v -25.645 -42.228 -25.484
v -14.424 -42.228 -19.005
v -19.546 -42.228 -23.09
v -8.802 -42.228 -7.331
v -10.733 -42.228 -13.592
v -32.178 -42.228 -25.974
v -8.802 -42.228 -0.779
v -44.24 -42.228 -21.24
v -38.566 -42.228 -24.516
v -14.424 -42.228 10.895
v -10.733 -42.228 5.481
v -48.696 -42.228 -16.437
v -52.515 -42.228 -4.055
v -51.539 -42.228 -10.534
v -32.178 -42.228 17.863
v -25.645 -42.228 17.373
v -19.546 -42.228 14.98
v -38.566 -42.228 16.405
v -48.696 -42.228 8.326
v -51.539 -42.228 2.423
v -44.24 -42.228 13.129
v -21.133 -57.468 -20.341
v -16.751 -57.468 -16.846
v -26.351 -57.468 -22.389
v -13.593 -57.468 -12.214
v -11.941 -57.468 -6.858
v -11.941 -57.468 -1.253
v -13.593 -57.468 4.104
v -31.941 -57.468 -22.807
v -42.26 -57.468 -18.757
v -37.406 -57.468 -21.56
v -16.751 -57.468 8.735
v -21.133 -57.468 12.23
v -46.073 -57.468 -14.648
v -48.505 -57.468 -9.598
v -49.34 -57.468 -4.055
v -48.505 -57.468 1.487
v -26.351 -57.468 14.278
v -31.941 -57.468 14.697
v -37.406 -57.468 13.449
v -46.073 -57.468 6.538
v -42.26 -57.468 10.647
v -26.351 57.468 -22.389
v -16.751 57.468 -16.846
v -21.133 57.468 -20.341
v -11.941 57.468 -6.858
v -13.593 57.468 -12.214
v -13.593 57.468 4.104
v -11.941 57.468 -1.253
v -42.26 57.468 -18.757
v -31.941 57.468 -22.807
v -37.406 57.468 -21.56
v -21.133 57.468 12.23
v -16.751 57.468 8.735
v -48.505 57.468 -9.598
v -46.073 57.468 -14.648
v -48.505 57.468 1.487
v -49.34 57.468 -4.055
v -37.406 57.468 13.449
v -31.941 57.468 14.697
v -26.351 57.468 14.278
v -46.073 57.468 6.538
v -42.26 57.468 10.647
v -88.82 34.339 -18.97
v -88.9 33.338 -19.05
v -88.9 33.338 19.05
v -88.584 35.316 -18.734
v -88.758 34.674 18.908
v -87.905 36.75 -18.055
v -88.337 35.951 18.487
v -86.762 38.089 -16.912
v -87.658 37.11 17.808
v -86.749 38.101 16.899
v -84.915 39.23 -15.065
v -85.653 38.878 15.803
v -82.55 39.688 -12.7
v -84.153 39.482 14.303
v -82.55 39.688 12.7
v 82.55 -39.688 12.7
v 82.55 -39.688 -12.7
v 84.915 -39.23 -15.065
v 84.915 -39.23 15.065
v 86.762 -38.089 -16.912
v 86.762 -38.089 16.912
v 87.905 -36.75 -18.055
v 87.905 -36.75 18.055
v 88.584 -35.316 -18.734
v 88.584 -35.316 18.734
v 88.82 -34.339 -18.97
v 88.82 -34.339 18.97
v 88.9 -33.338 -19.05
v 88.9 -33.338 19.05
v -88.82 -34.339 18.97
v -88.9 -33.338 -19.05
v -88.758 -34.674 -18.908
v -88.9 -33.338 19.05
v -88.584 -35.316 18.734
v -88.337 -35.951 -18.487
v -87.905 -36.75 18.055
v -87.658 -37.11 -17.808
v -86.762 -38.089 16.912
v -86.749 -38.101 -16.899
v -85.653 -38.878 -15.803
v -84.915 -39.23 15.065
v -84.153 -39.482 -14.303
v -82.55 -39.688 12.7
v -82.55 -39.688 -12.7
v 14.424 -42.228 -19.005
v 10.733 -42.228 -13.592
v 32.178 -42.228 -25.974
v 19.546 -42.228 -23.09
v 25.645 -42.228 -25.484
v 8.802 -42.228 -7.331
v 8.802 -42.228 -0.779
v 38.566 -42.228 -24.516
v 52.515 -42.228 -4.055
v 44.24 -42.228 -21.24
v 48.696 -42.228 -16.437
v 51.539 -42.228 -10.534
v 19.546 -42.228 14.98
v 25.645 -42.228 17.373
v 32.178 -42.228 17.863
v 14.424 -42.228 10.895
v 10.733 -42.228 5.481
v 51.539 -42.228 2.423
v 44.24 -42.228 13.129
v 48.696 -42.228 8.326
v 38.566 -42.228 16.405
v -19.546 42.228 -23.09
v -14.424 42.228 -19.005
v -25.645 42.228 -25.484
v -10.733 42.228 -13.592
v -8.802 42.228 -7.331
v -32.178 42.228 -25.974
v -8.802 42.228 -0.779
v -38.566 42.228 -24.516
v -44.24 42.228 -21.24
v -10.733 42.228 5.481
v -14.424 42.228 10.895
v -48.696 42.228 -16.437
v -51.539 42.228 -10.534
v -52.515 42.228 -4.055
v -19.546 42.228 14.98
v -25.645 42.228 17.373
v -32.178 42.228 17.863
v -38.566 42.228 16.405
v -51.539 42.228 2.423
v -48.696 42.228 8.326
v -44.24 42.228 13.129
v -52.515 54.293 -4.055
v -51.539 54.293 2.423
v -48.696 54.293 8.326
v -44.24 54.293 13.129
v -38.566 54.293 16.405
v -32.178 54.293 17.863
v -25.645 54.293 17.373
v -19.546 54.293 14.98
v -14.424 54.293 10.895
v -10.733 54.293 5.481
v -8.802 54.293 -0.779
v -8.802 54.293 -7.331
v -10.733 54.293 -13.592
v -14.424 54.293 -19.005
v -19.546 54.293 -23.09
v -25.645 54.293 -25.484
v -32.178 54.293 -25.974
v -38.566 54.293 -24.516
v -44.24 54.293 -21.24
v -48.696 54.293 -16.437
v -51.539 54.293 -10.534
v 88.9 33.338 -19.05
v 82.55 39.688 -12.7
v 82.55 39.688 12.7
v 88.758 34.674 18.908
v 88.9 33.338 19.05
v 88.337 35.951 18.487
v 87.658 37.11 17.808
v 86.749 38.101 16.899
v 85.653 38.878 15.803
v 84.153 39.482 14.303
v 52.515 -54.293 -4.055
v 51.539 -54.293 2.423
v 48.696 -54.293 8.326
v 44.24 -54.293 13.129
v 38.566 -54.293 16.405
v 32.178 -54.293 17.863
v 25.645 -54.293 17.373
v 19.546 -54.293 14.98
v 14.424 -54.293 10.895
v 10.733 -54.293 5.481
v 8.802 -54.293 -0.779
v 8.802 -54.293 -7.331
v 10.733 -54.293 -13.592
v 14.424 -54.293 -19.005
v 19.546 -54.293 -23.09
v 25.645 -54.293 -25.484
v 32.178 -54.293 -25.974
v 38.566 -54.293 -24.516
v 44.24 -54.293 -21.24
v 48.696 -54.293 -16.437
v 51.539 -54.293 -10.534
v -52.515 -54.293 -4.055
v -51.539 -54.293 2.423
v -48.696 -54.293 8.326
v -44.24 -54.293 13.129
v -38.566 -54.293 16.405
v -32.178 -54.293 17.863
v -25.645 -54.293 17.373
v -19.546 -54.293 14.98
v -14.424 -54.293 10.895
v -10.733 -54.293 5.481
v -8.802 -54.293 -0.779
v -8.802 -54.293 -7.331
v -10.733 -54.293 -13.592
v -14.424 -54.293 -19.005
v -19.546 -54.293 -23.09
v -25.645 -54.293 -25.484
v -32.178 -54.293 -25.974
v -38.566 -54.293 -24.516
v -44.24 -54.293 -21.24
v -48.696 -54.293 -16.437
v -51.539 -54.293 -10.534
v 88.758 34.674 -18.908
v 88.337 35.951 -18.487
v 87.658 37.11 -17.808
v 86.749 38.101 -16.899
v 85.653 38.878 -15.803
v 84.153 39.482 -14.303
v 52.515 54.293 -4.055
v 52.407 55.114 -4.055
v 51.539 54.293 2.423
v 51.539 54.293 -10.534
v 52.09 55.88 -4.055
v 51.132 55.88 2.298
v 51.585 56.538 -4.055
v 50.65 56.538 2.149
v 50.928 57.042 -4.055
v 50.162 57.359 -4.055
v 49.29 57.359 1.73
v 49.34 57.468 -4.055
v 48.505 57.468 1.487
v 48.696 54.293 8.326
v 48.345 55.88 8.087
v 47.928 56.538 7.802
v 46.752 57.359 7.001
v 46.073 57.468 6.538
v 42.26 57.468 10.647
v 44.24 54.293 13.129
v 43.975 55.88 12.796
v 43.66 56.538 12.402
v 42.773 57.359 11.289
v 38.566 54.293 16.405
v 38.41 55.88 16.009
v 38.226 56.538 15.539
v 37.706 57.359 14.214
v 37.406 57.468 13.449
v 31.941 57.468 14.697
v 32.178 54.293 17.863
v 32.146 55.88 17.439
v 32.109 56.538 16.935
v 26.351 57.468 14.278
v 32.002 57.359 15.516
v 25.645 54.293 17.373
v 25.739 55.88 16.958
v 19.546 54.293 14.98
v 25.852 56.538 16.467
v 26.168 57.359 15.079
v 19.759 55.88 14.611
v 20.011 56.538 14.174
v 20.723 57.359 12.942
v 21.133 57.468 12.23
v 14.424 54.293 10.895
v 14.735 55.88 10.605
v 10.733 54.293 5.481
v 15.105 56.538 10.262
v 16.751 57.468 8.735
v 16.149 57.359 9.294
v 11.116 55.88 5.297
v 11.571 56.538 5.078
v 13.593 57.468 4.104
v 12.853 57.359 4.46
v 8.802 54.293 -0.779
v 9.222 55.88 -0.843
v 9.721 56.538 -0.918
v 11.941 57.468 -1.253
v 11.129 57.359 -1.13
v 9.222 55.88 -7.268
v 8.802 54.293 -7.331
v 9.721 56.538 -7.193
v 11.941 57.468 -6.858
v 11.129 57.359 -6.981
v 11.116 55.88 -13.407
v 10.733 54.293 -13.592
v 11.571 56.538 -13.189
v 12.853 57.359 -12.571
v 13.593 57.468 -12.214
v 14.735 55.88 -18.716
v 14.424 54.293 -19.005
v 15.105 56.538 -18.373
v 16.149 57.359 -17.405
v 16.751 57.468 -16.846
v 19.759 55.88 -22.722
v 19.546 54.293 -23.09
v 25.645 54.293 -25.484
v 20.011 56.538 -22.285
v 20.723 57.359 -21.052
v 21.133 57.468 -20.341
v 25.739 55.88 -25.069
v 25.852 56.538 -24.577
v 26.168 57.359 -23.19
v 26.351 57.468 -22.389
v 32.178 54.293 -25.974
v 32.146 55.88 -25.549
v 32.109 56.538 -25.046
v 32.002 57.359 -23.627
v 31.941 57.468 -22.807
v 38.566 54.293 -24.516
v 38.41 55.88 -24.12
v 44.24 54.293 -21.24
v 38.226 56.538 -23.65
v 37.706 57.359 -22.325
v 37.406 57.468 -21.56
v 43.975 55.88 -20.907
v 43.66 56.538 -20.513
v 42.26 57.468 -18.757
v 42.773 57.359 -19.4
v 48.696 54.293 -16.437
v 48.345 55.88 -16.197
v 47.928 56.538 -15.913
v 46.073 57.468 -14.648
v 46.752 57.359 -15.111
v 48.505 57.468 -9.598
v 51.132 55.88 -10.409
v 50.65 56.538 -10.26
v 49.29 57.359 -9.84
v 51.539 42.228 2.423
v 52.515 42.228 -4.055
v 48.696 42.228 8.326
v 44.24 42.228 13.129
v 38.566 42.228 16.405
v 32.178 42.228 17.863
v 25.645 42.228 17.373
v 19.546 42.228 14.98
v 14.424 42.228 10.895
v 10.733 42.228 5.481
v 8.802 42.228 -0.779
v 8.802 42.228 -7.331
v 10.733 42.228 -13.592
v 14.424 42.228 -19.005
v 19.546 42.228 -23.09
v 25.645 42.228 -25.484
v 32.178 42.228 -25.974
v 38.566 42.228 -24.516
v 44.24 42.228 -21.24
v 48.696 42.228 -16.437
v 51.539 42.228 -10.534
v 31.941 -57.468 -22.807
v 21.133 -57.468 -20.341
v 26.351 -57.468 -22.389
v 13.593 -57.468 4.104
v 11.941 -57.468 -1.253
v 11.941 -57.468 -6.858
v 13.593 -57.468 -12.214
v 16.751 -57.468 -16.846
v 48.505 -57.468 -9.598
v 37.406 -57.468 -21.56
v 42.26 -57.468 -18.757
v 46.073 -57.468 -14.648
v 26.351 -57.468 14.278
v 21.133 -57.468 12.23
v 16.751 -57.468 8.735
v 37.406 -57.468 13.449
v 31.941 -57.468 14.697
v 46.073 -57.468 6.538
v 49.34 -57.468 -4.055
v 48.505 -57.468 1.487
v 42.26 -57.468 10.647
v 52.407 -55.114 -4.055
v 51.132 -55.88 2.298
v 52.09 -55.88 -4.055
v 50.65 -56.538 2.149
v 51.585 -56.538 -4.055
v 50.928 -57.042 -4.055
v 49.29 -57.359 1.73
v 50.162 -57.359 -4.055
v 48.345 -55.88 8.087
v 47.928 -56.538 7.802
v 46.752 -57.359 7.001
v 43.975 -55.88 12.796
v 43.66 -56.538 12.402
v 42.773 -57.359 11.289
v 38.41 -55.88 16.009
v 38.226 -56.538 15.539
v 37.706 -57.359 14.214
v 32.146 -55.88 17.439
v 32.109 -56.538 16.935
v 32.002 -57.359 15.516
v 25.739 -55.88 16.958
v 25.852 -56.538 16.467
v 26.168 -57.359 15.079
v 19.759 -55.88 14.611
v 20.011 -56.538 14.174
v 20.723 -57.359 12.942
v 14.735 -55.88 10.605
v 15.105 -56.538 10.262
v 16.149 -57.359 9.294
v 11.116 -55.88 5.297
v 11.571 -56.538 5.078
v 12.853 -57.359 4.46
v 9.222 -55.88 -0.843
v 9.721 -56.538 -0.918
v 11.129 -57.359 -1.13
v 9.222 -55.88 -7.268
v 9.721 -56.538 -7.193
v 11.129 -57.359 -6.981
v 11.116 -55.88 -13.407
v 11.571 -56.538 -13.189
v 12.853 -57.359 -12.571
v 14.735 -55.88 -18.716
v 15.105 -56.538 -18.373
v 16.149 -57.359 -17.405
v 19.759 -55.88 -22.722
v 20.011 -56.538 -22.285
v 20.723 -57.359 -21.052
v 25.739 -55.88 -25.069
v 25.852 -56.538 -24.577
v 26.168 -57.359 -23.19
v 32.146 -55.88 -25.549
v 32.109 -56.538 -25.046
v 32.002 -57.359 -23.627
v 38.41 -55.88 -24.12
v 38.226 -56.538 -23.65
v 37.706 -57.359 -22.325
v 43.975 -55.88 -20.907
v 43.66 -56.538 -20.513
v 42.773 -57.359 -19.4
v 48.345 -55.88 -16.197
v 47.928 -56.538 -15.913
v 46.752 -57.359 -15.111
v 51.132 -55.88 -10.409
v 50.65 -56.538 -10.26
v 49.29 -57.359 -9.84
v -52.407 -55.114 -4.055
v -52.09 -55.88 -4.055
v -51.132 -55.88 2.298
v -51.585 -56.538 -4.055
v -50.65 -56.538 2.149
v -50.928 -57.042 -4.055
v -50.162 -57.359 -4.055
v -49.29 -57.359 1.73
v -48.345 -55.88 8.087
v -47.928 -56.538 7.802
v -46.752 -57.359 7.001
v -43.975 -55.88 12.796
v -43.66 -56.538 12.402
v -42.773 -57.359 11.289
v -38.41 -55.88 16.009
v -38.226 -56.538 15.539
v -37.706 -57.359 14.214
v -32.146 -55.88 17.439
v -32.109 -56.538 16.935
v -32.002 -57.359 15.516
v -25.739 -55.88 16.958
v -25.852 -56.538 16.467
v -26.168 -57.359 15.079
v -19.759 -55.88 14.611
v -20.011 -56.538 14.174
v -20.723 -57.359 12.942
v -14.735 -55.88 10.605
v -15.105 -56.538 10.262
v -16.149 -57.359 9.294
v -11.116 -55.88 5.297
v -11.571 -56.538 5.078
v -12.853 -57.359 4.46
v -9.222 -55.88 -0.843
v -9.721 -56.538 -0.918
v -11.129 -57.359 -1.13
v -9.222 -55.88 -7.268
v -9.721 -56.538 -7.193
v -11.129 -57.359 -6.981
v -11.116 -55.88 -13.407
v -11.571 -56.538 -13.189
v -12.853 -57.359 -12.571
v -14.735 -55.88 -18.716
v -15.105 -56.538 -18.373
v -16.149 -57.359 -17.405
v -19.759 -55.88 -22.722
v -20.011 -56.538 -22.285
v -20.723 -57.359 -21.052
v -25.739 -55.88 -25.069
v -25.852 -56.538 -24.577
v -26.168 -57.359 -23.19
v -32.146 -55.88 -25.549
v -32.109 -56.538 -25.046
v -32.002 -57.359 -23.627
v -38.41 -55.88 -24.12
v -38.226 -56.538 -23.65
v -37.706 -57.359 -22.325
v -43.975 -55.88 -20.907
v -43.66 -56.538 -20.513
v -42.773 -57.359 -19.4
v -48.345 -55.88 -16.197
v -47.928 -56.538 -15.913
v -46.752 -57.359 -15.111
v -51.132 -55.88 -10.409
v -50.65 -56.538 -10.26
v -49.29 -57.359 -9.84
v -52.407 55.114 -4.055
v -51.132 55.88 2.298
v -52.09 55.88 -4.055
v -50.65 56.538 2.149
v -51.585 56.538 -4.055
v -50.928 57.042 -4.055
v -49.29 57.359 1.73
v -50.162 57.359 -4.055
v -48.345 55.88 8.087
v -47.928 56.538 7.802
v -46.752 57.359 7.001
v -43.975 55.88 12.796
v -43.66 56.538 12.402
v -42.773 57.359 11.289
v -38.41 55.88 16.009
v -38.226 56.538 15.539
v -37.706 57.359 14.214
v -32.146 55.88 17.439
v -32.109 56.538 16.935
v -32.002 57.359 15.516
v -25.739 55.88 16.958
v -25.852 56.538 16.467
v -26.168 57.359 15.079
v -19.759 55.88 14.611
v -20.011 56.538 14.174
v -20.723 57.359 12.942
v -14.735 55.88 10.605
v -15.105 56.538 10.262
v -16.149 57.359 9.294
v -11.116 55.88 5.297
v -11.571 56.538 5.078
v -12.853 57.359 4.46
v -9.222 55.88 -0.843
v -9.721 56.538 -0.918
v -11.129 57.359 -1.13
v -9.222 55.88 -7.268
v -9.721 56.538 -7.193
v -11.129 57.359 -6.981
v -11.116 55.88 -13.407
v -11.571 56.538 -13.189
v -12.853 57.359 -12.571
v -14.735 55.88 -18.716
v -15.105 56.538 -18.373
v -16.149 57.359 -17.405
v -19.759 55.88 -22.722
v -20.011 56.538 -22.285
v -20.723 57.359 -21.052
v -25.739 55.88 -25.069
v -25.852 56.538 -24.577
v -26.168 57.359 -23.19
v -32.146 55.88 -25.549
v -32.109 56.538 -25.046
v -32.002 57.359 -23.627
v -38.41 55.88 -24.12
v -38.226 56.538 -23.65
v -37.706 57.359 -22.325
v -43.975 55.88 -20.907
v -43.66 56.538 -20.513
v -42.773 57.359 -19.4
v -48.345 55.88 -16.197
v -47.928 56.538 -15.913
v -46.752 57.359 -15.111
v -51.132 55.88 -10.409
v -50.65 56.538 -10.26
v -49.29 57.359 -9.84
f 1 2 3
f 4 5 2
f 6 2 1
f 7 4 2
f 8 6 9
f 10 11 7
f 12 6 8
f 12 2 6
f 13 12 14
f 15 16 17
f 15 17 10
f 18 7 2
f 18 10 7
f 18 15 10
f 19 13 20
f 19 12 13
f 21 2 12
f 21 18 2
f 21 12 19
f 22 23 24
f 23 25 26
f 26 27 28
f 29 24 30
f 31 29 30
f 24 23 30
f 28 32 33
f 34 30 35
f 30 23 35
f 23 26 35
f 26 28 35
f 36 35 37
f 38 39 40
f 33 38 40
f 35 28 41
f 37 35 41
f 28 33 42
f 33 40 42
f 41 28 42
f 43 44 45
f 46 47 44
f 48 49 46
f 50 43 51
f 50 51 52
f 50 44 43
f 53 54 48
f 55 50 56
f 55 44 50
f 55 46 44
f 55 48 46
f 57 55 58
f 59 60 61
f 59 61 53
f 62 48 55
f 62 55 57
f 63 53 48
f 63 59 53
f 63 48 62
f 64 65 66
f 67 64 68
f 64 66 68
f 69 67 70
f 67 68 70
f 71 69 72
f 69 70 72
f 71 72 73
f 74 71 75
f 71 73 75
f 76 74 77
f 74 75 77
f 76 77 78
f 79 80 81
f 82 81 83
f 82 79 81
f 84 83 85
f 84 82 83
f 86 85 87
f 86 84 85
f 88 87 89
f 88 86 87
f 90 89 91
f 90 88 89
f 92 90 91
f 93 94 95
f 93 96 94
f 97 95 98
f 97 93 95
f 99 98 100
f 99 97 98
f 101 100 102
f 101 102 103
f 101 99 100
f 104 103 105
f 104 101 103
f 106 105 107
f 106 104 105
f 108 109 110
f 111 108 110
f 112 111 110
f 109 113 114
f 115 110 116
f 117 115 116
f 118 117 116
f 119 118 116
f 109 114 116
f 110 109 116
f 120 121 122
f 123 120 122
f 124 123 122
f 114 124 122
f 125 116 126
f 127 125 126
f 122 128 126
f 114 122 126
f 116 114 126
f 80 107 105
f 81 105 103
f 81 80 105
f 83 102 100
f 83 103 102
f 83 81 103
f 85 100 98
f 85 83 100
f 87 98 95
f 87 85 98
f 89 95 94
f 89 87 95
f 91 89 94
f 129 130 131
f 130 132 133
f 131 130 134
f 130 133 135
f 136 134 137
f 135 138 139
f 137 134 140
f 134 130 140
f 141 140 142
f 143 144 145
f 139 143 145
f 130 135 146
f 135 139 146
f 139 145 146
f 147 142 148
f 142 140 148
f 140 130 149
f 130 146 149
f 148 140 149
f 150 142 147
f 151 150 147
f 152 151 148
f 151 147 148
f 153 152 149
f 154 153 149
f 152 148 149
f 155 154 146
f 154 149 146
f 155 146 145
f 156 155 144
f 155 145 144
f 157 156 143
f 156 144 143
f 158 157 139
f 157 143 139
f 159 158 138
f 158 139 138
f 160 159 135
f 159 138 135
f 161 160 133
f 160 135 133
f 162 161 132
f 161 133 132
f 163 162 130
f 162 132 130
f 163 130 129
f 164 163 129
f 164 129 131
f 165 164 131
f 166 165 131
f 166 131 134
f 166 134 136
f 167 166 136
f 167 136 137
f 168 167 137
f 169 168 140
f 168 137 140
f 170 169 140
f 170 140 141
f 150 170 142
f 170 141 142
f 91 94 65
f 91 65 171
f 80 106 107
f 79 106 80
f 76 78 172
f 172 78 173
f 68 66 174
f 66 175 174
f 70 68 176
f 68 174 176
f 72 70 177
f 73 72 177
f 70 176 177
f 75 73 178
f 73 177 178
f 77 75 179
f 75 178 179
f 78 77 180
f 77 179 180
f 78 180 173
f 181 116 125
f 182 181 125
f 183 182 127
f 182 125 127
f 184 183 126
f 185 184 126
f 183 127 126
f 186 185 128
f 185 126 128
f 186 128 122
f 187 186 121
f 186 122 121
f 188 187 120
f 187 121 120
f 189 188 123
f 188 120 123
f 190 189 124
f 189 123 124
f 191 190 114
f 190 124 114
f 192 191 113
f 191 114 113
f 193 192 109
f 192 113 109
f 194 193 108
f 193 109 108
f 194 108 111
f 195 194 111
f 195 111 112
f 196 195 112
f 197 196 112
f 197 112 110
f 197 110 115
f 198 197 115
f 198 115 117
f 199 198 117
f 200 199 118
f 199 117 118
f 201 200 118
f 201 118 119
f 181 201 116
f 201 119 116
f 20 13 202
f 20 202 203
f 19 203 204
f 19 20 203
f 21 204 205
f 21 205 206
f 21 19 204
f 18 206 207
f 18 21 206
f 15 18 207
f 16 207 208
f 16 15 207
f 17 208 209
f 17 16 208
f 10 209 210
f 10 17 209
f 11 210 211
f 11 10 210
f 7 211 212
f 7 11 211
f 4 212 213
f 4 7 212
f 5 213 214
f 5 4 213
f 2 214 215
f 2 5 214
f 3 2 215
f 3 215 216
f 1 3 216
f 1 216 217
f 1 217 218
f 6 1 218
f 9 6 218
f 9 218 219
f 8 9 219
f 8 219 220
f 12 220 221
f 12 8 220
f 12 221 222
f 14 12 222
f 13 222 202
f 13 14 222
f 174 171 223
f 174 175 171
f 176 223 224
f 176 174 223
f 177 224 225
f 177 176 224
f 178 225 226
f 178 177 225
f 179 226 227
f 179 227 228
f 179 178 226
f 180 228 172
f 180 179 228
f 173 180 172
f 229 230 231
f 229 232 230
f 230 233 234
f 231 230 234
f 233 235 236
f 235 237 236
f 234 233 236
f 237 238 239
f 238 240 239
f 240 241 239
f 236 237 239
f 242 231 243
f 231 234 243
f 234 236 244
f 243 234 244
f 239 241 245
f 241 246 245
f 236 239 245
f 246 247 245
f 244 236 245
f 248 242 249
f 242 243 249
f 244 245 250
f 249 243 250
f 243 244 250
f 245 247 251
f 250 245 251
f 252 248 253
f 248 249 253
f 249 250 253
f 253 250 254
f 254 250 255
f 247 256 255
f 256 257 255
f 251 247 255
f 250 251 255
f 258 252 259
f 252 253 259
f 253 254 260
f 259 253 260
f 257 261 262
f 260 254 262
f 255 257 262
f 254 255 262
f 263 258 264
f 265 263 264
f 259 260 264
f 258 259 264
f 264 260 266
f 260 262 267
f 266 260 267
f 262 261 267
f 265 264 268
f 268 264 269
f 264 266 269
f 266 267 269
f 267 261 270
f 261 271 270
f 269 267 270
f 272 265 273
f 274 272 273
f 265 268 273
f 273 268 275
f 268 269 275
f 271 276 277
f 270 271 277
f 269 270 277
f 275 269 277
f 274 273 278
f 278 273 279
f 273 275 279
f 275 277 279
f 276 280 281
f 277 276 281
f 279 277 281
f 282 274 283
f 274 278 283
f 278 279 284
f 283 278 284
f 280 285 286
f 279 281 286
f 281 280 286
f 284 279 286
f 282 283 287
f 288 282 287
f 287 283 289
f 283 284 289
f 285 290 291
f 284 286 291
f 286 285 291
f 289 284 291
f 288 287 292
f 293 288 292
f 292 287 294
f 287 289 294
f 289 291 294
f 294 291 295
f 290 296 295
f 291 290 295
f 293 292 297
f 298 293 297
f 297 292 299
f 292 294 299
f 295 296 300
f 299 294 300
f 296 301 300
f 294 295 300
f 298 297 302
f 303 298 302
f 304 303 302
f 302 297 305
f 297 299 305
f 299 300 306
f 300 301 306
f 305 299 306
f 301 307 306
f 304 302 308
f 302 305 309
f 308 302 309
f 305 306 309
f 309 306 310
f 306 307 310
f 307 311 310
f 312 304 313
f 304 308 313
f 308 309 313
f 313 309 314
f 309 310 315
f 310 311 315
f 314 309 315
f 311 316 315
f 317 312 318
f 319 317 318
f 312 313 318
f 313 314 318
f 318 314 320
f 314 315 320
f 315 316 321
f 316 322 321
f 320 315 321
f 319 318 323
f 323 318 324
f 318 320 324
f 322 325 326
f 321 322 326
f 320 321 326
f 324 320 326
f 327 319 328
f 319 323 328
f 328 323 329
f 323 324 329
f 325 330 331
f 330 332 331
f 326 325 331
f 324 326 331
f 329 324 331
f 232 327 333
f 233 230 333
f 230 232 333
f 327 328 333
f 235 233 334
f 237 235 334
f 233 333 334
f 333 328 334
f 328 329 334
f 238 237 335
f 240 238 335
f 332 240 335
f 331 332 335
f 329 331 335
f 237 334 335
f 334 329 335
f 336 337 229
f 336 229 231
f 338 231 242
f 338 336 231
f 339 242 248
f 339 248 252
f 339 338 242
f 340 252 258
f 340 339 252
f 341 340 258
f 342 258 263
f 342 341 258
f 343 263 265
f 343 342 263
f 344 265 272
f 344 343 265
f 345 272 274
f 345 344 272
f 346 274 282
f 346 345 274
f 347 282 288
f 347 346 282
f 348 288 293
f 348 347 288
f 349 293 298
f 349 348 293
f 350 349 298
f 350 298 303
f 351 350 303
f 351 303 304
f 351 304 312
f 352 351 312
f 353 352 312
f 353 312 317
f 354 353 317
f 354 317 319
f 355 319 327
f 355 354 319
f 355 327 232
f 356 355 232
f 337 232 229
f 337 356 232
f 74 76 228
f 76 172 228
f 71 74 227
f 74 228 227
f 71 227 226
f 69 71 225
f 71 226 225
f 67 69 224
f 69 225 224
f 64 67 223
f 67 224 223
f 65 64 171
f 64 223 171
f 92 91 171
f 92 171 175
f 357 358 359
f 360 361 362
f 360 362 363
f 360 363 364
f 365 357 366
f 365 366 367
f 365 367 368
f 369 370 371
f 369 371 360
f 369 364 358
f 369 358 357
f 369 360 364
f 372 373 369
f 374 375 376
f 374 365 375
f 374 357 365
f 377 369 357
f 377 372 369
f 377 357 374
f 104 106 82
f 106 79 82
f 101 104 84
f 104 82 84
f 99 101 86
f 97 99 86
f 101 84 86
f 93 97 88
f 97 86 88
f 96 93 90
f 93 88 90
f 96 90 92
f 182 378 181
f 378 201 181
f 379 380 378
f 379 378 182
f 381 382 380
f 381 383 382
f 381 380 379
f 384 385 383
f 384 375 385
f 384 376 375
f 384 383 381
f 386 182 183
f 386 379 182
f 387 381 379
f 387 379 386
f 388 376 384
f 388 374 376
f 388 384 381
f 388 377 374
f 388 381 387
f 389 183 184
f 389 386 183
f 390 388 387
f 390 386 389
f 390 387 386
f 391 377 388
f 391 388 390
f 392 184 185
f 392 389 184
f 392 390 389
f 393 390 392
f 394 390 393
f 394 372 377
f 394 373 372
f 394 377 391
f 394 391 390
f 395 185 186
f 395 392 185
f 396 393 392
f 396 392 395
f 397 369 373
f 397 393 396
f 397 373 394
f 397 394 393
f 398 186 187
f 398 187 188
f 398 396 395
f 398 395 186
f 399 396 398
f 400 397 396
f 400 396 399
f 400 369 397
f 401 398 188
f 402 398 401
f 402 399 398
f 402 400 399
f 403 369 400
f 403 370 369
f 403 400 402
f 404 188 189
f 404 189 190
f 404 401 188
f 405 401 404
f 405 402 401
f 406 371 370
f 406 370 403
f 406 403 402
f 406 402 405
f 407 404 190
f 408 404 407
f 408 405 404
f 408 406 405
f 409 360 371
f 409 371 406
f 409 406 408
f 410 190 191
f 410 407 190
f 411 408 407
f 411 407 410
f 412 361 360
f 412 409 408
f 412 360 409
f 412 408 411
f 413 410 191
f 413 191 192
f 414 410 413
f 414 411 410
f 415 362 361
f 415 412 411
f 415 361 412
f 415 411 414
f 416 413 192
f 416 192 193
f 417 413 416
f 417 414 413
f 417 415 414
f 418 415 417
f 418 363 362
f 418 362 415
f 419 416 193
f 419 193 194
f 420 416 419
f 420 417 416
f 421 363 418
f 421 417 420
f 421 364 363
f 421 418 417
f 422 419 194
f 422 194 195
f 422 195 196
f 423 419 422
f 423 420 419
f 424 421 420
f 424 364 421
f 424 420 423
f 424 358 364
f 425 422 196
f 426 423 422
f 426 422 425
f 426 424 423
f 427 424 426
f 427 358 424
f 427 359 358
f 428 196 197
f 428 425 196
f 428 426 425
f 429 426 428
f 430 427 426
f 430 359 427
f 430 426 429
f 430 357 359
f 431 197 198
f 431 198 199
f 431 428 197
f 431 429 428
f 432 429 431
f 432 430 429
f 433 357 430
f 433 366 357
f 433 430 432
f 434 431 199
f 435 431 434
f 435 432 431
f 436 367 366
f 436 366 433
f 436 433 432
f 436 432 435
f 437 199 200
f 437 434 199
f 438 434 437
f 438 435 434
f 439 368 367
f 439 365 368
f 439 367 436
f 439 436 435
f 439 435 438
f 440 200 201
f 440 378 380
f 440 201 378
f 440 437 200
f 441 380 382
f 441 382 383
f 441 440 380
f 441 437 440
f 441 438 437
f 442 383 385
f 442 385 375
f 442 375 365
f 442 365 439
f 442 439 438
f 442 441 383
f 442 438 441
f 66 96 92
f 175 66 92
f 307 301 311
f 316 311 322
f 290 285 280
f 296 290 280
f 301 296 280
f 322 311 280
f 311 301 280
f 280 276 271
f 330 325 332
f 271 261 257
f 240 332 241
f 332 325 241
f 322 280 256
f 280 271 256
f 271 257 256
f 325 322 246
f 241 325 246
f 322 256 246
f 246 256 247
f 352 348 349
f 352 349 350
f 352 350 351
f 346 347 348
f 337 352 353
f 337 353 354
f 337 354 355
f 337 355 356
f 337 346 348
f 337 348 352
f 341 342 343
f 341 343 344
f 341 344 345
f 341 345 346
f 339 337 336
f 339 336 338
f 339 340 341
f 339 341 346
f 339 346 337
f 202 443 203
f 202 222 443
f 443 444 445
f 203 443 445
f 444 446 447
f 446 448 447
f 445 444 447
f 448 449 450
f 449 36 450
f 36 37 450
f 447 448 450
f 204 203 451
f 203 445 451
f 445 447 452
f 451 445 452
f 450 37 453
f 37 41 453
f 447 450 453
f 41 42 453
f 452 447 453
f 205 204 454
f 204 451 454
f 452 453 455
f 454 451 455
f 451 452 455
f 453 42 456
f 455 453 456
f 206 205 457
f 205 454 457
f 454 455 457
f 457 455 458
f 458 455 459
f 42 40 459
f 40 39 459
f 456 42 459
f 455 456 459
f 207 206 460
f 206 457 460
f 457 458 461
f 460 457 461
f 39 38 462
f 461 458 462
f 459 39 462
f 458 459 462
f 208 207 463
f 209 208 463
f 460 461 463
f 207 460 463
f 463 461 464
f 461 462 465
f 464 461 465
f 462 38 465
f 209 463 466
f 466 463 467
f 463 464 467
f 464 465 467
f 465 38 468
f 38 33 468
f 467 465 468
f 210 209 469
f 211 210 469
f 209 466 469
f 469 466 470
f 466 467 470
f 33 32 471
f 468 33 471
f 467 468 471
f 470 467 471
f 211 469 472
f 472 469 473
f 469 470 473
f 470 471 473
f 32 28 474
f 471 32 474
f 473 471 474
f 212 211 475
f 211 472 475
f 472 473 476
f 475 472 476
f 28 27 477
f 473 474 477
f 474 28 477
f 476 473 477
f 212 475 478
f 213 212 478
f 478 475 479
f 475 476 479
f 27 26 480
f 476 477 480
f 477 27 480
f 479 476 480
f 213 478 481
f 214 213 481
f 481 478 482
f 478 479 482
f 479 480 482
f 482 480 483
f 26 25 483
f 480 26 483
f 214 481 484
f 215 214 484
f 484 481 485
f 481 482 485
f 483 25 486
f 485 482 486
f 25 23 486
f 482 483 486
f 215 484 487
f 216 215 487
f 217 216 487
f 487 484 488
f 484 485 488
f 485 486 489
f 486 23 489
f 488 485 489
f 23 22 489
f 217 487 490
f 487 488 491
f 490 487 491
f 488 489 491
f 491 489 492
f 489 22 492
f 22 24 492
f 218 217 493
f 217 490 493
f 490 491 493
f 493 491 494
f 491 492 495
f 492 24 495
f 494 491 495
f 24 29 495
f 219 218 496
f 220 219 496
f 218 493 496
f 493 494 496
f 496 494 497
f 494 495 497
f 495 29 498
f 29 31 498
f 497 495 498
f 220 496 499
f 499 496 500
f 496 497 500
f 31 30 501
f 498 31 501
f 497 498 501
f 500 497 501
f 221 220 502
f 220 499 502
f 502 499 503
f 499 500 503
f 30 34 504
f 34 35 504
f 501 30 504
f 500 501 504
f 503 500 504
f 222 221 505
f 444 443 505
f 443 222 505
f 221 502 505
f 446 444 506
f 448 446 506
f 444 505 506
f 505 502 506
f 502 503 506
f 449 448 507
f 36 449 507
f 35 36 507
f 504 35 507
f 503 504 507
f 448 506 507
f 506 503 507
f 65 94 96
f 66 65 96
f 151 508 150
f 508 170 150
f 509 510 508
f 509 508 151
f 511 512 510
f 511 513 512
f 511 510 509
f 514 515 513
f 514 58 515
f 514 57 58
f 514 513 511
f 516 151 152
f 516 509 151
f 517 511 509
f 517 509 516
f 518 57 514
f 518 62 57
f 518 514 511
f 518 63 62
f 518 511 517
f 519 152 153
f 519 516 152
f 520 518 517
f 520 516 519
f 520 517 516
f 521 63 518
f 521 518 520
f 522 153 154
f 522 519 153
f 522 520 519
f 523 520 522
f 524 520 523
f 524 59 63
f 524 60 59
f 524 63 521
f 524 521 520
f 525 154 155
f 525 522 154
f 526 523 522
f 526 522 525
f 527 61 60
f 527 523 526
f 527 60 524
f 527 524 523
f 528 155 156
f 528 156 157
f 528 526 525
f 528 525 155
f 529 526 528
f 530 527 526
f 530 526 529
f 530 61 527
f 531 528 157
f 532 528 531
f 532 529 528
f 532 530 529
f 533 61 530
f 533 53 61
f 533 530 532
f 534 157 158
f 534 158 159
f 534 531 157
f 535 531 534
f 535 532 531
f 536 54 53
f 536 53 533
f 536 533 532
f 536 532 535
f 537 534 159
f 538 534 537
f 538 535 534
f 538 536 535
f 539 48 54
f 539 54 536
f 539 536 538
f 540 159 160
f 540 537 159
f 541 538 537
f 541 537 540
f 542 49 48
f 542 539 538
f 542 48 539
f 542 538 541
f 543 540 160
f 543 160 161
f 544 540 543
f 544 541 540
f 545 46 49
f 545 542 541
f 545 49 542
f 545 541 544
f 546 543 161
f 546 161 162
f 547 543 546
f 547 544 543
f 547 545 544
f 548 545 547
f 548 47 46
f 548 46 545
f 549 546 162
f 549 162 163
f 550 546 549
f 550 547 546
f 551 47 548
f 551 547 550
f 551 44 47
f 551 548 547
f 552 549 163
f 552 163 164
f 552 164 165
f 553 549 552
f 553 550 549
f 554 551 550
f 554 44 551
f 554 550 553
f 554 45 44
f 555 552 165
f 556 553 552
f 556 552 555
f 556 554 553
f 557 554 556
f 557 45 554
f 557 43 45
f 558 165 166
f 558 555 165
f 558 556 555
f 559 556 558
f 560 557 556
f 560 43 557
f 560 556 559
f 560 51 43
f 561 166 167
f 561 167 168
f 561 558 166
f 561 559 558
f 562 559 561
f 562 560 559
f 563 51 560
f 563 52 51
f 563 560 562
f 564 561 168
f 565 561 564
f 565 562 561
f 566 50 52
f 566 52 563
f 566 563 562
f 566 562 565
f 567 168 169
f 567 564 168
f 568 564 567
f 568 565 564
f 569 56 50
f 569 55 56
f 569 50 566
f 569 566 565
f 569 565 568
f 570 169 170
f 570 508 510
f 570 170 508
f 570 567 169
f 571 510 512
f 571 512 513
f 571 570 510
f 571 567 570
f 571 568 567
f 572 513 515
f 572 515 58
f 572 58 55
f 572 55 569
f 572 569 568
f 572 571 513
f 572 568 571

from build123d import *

# Parameters (mm, degrees)
F1_W     = 177.8
F1_H     = 38.1
F3_DEPTH = 39.6875
F5_R     = 21.9796121182
F6_DEPTH = 15.24
F7_R     = 3.175
F8_R     = 6.35


# Not quite as in the source:
# - the program builds the solid bodies; features that only make, move or delete a surface that nothing else refers to are left out


with BuildPart() as f3:
    # F1 (on face) → F3 (new body, symmetric)
    with BuildSketch(Plane.XZ):
        Rectangle(F1_W, F1_H)
    extrude(amount=F3_DEPTH, both=True)

    # F8
    f8_edges = [f3.edges().sort_by_distance(p)[0] for p in [
        (0, -39.6875, 19.05),
        (-88.9, -39.6875, 0),
        (0, -39.6875, -19.05),
        (88.9, -39.6875, 0),
        (88.9, 39.6875, 0),
        (0, 39.6875, 19.05),
        (0, 39.6875, -19.05),
        (-88.9, 39.6875, 0),
    ]]
    fillet(f8_edges, radius=F8_R)


with BuildPart() as f6:
    # F5 (on offset) → F6 (new body)
    with BuildSketch(Plane.XZ.offset(42.2275)):
        with Locations((30.5357445031, -4.0553878818)):
            Circle(F5_R)
    extrude(amount=F6_DEPTH)

    # F7
    f7_edges = [f6.edges().sort_by_distance(p)[0] for p in [
        (8.556132, -57.4675, -4.055388),
    ]]
    fillet(f7_edges, radius=F7_R)


with BuildPart() as f9_1:
    # F9: instance of F6
    add(f6.part.mirror(Plane.XZ))


with BuildPart() as f10_1:
    # F10: instance of F6
    add(f6.part.mirror(Plane.YZ))


with BuildPart() as f10_2:
    # F10: instance of F9_1
    add(f9_1.part.mirror(Plane.YZ))


solid = Compound([f3.part, f6.part, f9_1.part, f10_1.part, f10_2.part])
